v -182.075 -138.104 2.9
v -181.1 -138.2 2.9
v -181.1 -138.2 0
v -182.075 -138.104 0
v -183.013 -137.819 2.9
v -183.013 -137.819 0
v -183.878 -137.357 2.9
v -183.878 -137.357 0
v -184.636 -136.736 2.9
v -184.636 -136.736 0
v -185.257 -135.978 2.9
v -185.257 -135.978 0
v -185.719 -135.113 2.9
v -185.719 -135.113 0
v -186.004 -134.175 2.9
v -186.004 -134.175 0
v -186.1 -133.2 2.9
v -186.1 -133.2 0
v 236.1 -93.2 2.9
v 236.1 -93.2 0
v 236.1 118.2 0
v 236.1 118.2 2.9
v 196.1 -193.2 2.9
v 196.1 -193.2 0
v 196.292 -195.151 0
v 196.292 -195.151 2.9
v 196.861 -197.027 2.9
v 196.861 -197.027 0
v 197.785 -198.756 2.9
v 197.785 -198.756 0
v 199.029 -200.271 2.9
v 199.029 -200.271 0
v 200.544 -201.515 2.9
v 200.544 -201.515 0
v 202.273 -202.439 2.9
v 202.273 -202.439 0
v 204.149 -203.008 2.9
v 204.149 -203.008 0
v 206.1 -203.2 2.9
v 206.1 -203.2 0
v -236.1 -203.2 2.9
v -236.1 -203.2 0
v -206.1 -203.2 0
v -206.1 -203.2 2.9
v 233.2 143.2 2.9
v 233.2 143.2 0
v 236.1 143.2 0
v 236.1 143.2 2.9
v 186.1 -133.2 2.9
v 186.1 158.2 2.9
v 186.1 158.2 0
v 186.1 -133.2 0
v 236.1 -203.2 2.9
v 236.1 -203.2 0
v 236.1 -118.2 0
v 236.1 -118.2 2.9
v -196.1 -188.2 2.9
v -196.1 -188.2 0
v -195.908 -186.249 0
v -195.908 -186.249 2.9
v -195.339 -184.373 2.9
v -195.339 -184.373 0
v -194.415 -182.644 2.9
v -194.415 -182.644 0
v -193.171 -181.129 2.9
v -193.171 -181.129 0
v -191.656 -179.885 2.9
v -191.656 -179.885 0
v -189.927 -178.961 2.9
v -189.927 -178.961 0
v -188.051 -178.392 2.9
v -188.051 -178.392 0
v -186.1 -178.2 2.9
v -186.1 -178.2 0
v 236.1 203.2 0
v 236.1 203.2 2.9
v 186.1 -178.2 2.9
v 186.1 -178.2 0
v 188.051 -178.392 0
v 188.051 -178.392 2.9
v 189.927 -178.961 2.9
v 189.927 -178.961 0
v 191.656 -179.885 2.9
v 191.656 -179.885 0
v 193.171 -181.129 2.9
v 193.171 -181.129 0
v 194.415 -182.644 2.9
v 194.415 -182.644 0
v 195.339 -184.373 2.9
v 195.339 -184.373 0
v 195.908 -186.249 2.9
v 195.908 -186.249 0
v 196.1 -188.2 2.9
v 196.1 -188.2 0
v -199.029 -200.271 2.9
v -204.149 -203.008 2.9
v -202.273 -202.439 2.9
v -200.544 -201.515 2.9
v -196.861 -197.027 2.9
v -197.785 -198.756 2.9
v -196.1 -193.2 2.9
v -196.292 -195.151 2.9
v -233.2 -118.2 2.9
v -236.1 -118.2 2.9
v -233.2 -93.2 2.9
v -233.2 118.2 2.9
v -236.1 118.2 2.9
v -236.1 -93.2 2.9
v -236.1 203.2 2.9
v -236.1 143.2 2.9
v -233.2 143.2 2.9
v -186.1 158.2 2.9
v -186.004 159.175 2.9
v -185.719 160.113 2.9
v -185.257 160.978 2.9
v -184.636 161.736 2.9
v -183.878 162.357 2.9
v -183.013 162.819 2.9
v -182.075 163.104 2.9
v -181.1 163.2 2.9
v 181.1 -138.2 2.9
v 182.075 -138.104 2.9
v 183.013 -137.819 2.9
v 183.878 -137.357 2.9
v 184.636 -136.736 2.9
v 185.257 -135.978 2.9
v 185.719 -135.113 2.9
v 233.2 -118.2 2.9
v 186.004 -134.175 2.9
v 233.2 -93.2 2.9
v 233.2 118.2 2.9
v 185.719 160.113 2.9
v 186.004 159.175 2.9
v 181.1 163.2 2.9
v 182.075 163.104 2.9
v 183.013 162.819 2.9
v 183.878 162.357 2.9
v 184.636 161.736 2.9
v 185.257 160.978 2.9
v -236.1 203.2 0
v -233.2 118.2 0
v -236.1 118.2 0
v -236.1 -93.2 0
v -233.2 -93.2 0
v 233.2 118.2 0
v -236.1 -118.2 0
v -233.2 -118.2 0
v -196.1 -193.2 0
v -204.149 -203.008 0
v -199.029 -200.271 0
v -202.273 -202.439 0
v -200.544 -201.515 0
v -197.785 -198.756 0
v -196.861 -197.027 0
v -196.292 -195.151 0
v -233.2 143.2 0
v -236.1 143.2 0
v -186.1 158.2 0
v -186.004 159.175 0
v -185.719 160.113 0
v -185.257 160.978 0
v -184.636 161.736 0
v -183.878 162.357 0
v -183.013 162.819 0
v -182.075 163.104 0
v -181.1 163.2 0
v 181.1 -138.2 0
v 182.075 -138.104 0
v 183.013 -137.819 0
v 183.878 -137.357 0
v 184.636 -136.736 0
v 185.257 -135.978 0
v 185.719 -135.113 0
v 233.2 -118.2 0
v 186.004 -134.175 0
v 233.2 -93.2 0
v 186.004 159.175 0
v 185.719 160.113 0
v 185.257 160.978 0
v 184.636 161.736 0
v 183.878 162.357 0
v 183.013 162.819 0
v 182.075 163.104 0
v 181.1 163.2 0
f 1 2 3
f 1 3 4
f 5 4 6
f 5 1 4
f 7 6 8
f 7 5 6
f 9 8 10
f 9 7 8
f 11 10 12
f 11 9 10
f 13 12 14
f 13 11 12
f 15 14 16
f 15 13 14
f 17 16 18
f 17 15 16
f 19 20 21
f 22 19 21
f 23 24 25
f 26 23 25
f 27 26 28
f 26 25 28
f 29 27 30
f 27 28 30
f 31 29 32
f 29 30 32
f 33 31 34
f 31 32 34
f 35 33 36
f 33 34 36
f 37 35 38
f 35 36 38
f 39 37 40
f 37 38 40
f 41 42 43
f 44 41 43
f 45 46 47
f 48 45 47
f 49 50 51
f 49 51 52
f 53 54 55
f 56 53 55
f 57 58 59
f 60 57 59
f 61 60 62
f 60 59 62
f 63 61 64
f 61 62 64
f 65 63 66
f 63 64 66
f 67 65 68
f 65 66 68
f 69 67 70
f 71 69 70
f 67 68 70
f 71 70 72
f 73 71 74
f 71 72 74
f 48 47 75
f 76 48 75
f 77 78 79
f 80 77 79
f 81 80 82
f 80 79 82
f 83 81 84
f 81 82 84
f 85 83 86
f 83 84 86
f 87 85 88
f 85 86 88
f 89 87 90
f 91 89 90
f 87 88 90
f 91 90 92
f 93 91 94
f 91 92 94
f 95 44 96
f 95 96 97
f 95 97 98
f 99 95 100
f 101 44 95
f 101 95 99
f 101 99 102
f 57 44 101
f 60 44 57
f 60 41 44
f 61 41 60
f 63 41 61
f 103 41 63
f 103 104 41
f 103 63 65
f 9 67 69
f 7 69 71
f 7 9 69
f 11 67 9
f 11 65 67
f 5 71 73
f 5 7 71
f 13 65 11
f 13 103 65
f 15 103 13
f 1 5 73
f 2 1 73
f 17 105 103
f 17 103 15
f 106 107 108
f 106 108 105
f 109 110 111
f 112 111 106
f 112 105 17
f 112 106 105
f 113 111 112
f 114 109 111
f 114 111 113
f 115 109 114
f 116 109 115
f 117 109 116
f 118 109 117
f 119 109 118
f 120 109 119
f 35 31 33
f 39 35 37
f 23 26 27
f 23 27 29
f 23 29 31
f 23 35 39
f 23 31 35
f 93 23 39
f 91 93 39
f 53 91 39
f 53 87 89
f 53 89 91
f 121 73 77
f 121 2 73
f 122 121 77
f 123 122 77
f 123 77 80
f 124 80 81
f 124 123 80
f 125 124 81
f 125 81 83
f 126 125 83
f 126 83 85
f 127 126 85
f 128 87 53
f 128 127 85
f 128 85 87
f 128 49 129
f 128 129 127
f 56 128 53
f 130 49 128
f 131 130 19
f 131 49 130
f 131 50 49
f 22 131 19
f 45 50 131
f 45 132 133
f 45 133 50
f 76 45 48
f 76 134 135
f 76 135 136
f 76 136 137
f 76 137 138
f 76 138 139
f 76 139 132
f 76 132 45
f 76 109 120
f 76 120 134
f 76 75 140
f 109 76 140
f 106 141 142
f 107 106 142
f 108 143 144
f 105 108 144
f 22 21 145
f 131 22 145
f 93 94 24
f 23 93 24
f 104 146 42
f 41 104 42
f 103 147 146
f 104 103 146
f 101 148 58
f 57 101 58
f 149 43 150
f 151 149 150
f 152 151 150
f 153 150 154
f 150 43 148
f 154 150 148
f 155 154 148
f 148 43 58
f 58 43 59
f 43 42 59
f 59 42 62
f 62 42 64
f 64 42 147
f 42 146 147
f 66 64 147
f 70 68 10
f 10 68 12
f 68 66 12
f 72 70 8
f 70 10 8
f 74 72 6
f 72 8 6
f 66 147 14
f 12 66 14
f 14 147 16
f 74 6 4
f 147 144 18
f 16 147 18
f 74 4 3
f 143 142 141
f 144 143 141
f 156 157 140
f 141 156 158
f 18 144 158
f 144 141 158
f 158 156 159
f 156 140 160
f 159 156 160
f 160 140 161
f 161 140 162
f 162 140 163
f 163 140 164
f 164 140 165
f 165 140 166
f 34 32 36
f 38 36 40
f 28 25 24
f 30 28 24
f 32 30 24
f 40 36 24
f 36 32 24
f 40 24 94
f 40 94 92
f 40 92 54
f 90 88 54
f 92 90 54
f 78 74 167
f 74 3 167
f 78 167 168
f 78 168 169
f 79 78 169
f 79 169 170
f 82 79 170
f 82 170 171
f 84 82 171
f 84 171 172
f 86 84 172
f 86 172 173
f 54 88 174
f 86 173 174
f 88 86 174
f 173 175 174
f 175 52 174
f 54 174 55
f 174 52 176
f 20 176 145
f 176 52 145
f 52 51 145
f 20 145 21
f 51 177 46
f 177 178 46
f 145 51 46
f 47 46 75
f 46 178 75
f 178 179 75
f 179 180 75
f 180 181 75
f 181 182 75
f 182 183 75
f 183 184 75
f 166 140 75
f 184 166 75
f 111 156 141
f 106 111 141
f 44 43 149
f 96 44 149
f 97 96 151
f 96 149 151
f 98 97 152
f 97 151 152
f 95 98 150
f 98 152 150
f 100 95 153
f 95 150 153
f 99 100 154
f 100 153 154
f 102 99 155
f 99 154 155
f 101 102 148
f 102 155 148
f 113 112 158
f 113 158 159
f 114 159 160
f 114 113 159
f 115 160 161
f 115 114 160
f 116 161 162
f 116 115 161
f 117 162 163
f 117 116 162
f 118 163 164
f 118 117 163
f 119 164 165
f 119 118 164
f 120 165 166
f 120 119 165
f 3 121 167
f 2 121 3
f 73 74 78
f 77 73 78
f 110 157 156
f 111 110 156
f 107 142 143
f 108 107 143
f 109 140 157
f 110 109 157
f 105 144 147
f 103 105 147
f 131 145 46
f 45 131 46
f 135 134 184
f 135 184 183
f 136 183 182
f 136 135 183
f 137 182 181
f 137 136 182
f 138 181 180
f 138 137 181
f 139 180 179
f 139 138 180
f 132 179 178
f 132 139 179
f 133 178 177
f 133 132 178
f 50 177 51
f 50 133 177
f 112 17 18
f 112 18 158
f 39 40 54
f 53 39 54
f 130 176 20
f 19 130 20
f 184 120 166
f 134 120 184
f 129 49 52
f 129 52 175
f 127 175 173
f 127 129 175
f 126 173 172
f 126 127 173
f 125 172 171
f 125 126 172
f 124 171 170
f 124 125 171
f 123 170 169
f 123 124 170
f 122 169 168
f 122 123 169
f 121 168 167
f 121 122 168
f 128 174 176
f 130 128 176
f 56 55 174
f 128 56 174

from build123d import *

# Parameters (mm, degrees)
BOSS_EXTRUDE1_DEPTH = 2.9
CUT_EXTRUDE1_DEPTH  = 3.9


with BuildPart() as part:
    # Sketch1 → Boss-Extrude1 (new body)
    with BuildSketch(Plane.XY):
        with BuildLine():
            Line((206.1, -203.2), (236.1, -203.2))
            Line((236.1, -203.2), (236.1, -118.2))
            Line((236.1, -118.2), (233.2, -118.2))
            Line((233.2, -118.2), (233.2, -93.2))
            Line((233.2, -93.2), (236.1, -93.2))
            Line((236.1, -93.2), (236.1, 118.2))
            Line((236.1, 118.2), (233.2, 118.2))
            Line((233.2, 118.2), (233.2, 143.2))
            Line((233.2, 143.2), (236.1, 143.2))
            Line((236.1, 143.2), (236.1, 203.2))
            Line((236.1, 203.2), (-236.1, 203.2))
            Line((-236.1, 203.2), (-236.1, 143.2))
            Line((-236.1, 143.2), (-233.2, 143.2))
            Line((-233.2, 143.2), (-233.2, 118.2))
            Line((-233.2, 118.2), (-236.1, 118.2))
            Line((-236.1, 118.2), (-236.1, -93.2))
            Line((-236.1, -93.2), (-233.2, -93.2))
            Line((-233.2, -93.2), (-233.2, -118.2))
            Line((-233.2, -118.2), (-236.1, -118.2))
            Line((-236.1, -118.2), (-236.1, -203.2))
            Line((-236.1, -203.2), (-206.1, -203.2))
            ThreePointArc((-206.1, -203.2), (-199.028932188, -200.271067812), (-196.1, -193.2))
            Line((-196.1, -193.2), (-196.1, -188.2))
            ThreePointArc((-196.1, -188.2), (-193.171067812, -181.128932188), (-186.1, -178.2))
            Line((-186.1, -178.2), (186.1, -178.2))
            ThreePointArc((186.1, -178.2), (193.171067812, -181.128932188), (196.1, -188.2))
            Line((196.1, -188.2), (196.1, -193.2))
            ThreePointArc((196.1, -193.2), (199.028932188, -200.271067812), (206.1, -203.2))
        make_face()
    extrude(amount=BOSS_EXTRUDE1_DEPTH)

    # Sketch2 → Cut-Extrude1 (cut, through all)
    with BuildSketch(Plane.XY.offset(2.9)):
        with BuildLine():
            Line((-181.1, 163.2), (181.1, 163.2))
            ThreePointArc((181.1, 163.2), (184.635533906, 161.735533906), (186.1, 158.2))
            Line((186.1, 158.2), (186.1, -133.2))
            ThreePointArc((186.1, -133.2), (184.635533906, -136.735533906), (181.1, -138.2))
            Line((181.1, -138.2), (-181.1, -138.2))
            ThreePointArc((-181.1, -138.2), (-184.635533906, -136.735533906), (-186.1, -133.2))
            Line((-186.1, -133.2), (-186.1, 158.2))
            ThreePointArc((-186.1, 158.2), (-184.635533906, 161.735533906), (-181.1, 163.2))
        make_face()
    extrude(amount=-CUT_EXTRUDE1_DEPTH, mode=Mode.SUBTRACT)


solid = part.part
